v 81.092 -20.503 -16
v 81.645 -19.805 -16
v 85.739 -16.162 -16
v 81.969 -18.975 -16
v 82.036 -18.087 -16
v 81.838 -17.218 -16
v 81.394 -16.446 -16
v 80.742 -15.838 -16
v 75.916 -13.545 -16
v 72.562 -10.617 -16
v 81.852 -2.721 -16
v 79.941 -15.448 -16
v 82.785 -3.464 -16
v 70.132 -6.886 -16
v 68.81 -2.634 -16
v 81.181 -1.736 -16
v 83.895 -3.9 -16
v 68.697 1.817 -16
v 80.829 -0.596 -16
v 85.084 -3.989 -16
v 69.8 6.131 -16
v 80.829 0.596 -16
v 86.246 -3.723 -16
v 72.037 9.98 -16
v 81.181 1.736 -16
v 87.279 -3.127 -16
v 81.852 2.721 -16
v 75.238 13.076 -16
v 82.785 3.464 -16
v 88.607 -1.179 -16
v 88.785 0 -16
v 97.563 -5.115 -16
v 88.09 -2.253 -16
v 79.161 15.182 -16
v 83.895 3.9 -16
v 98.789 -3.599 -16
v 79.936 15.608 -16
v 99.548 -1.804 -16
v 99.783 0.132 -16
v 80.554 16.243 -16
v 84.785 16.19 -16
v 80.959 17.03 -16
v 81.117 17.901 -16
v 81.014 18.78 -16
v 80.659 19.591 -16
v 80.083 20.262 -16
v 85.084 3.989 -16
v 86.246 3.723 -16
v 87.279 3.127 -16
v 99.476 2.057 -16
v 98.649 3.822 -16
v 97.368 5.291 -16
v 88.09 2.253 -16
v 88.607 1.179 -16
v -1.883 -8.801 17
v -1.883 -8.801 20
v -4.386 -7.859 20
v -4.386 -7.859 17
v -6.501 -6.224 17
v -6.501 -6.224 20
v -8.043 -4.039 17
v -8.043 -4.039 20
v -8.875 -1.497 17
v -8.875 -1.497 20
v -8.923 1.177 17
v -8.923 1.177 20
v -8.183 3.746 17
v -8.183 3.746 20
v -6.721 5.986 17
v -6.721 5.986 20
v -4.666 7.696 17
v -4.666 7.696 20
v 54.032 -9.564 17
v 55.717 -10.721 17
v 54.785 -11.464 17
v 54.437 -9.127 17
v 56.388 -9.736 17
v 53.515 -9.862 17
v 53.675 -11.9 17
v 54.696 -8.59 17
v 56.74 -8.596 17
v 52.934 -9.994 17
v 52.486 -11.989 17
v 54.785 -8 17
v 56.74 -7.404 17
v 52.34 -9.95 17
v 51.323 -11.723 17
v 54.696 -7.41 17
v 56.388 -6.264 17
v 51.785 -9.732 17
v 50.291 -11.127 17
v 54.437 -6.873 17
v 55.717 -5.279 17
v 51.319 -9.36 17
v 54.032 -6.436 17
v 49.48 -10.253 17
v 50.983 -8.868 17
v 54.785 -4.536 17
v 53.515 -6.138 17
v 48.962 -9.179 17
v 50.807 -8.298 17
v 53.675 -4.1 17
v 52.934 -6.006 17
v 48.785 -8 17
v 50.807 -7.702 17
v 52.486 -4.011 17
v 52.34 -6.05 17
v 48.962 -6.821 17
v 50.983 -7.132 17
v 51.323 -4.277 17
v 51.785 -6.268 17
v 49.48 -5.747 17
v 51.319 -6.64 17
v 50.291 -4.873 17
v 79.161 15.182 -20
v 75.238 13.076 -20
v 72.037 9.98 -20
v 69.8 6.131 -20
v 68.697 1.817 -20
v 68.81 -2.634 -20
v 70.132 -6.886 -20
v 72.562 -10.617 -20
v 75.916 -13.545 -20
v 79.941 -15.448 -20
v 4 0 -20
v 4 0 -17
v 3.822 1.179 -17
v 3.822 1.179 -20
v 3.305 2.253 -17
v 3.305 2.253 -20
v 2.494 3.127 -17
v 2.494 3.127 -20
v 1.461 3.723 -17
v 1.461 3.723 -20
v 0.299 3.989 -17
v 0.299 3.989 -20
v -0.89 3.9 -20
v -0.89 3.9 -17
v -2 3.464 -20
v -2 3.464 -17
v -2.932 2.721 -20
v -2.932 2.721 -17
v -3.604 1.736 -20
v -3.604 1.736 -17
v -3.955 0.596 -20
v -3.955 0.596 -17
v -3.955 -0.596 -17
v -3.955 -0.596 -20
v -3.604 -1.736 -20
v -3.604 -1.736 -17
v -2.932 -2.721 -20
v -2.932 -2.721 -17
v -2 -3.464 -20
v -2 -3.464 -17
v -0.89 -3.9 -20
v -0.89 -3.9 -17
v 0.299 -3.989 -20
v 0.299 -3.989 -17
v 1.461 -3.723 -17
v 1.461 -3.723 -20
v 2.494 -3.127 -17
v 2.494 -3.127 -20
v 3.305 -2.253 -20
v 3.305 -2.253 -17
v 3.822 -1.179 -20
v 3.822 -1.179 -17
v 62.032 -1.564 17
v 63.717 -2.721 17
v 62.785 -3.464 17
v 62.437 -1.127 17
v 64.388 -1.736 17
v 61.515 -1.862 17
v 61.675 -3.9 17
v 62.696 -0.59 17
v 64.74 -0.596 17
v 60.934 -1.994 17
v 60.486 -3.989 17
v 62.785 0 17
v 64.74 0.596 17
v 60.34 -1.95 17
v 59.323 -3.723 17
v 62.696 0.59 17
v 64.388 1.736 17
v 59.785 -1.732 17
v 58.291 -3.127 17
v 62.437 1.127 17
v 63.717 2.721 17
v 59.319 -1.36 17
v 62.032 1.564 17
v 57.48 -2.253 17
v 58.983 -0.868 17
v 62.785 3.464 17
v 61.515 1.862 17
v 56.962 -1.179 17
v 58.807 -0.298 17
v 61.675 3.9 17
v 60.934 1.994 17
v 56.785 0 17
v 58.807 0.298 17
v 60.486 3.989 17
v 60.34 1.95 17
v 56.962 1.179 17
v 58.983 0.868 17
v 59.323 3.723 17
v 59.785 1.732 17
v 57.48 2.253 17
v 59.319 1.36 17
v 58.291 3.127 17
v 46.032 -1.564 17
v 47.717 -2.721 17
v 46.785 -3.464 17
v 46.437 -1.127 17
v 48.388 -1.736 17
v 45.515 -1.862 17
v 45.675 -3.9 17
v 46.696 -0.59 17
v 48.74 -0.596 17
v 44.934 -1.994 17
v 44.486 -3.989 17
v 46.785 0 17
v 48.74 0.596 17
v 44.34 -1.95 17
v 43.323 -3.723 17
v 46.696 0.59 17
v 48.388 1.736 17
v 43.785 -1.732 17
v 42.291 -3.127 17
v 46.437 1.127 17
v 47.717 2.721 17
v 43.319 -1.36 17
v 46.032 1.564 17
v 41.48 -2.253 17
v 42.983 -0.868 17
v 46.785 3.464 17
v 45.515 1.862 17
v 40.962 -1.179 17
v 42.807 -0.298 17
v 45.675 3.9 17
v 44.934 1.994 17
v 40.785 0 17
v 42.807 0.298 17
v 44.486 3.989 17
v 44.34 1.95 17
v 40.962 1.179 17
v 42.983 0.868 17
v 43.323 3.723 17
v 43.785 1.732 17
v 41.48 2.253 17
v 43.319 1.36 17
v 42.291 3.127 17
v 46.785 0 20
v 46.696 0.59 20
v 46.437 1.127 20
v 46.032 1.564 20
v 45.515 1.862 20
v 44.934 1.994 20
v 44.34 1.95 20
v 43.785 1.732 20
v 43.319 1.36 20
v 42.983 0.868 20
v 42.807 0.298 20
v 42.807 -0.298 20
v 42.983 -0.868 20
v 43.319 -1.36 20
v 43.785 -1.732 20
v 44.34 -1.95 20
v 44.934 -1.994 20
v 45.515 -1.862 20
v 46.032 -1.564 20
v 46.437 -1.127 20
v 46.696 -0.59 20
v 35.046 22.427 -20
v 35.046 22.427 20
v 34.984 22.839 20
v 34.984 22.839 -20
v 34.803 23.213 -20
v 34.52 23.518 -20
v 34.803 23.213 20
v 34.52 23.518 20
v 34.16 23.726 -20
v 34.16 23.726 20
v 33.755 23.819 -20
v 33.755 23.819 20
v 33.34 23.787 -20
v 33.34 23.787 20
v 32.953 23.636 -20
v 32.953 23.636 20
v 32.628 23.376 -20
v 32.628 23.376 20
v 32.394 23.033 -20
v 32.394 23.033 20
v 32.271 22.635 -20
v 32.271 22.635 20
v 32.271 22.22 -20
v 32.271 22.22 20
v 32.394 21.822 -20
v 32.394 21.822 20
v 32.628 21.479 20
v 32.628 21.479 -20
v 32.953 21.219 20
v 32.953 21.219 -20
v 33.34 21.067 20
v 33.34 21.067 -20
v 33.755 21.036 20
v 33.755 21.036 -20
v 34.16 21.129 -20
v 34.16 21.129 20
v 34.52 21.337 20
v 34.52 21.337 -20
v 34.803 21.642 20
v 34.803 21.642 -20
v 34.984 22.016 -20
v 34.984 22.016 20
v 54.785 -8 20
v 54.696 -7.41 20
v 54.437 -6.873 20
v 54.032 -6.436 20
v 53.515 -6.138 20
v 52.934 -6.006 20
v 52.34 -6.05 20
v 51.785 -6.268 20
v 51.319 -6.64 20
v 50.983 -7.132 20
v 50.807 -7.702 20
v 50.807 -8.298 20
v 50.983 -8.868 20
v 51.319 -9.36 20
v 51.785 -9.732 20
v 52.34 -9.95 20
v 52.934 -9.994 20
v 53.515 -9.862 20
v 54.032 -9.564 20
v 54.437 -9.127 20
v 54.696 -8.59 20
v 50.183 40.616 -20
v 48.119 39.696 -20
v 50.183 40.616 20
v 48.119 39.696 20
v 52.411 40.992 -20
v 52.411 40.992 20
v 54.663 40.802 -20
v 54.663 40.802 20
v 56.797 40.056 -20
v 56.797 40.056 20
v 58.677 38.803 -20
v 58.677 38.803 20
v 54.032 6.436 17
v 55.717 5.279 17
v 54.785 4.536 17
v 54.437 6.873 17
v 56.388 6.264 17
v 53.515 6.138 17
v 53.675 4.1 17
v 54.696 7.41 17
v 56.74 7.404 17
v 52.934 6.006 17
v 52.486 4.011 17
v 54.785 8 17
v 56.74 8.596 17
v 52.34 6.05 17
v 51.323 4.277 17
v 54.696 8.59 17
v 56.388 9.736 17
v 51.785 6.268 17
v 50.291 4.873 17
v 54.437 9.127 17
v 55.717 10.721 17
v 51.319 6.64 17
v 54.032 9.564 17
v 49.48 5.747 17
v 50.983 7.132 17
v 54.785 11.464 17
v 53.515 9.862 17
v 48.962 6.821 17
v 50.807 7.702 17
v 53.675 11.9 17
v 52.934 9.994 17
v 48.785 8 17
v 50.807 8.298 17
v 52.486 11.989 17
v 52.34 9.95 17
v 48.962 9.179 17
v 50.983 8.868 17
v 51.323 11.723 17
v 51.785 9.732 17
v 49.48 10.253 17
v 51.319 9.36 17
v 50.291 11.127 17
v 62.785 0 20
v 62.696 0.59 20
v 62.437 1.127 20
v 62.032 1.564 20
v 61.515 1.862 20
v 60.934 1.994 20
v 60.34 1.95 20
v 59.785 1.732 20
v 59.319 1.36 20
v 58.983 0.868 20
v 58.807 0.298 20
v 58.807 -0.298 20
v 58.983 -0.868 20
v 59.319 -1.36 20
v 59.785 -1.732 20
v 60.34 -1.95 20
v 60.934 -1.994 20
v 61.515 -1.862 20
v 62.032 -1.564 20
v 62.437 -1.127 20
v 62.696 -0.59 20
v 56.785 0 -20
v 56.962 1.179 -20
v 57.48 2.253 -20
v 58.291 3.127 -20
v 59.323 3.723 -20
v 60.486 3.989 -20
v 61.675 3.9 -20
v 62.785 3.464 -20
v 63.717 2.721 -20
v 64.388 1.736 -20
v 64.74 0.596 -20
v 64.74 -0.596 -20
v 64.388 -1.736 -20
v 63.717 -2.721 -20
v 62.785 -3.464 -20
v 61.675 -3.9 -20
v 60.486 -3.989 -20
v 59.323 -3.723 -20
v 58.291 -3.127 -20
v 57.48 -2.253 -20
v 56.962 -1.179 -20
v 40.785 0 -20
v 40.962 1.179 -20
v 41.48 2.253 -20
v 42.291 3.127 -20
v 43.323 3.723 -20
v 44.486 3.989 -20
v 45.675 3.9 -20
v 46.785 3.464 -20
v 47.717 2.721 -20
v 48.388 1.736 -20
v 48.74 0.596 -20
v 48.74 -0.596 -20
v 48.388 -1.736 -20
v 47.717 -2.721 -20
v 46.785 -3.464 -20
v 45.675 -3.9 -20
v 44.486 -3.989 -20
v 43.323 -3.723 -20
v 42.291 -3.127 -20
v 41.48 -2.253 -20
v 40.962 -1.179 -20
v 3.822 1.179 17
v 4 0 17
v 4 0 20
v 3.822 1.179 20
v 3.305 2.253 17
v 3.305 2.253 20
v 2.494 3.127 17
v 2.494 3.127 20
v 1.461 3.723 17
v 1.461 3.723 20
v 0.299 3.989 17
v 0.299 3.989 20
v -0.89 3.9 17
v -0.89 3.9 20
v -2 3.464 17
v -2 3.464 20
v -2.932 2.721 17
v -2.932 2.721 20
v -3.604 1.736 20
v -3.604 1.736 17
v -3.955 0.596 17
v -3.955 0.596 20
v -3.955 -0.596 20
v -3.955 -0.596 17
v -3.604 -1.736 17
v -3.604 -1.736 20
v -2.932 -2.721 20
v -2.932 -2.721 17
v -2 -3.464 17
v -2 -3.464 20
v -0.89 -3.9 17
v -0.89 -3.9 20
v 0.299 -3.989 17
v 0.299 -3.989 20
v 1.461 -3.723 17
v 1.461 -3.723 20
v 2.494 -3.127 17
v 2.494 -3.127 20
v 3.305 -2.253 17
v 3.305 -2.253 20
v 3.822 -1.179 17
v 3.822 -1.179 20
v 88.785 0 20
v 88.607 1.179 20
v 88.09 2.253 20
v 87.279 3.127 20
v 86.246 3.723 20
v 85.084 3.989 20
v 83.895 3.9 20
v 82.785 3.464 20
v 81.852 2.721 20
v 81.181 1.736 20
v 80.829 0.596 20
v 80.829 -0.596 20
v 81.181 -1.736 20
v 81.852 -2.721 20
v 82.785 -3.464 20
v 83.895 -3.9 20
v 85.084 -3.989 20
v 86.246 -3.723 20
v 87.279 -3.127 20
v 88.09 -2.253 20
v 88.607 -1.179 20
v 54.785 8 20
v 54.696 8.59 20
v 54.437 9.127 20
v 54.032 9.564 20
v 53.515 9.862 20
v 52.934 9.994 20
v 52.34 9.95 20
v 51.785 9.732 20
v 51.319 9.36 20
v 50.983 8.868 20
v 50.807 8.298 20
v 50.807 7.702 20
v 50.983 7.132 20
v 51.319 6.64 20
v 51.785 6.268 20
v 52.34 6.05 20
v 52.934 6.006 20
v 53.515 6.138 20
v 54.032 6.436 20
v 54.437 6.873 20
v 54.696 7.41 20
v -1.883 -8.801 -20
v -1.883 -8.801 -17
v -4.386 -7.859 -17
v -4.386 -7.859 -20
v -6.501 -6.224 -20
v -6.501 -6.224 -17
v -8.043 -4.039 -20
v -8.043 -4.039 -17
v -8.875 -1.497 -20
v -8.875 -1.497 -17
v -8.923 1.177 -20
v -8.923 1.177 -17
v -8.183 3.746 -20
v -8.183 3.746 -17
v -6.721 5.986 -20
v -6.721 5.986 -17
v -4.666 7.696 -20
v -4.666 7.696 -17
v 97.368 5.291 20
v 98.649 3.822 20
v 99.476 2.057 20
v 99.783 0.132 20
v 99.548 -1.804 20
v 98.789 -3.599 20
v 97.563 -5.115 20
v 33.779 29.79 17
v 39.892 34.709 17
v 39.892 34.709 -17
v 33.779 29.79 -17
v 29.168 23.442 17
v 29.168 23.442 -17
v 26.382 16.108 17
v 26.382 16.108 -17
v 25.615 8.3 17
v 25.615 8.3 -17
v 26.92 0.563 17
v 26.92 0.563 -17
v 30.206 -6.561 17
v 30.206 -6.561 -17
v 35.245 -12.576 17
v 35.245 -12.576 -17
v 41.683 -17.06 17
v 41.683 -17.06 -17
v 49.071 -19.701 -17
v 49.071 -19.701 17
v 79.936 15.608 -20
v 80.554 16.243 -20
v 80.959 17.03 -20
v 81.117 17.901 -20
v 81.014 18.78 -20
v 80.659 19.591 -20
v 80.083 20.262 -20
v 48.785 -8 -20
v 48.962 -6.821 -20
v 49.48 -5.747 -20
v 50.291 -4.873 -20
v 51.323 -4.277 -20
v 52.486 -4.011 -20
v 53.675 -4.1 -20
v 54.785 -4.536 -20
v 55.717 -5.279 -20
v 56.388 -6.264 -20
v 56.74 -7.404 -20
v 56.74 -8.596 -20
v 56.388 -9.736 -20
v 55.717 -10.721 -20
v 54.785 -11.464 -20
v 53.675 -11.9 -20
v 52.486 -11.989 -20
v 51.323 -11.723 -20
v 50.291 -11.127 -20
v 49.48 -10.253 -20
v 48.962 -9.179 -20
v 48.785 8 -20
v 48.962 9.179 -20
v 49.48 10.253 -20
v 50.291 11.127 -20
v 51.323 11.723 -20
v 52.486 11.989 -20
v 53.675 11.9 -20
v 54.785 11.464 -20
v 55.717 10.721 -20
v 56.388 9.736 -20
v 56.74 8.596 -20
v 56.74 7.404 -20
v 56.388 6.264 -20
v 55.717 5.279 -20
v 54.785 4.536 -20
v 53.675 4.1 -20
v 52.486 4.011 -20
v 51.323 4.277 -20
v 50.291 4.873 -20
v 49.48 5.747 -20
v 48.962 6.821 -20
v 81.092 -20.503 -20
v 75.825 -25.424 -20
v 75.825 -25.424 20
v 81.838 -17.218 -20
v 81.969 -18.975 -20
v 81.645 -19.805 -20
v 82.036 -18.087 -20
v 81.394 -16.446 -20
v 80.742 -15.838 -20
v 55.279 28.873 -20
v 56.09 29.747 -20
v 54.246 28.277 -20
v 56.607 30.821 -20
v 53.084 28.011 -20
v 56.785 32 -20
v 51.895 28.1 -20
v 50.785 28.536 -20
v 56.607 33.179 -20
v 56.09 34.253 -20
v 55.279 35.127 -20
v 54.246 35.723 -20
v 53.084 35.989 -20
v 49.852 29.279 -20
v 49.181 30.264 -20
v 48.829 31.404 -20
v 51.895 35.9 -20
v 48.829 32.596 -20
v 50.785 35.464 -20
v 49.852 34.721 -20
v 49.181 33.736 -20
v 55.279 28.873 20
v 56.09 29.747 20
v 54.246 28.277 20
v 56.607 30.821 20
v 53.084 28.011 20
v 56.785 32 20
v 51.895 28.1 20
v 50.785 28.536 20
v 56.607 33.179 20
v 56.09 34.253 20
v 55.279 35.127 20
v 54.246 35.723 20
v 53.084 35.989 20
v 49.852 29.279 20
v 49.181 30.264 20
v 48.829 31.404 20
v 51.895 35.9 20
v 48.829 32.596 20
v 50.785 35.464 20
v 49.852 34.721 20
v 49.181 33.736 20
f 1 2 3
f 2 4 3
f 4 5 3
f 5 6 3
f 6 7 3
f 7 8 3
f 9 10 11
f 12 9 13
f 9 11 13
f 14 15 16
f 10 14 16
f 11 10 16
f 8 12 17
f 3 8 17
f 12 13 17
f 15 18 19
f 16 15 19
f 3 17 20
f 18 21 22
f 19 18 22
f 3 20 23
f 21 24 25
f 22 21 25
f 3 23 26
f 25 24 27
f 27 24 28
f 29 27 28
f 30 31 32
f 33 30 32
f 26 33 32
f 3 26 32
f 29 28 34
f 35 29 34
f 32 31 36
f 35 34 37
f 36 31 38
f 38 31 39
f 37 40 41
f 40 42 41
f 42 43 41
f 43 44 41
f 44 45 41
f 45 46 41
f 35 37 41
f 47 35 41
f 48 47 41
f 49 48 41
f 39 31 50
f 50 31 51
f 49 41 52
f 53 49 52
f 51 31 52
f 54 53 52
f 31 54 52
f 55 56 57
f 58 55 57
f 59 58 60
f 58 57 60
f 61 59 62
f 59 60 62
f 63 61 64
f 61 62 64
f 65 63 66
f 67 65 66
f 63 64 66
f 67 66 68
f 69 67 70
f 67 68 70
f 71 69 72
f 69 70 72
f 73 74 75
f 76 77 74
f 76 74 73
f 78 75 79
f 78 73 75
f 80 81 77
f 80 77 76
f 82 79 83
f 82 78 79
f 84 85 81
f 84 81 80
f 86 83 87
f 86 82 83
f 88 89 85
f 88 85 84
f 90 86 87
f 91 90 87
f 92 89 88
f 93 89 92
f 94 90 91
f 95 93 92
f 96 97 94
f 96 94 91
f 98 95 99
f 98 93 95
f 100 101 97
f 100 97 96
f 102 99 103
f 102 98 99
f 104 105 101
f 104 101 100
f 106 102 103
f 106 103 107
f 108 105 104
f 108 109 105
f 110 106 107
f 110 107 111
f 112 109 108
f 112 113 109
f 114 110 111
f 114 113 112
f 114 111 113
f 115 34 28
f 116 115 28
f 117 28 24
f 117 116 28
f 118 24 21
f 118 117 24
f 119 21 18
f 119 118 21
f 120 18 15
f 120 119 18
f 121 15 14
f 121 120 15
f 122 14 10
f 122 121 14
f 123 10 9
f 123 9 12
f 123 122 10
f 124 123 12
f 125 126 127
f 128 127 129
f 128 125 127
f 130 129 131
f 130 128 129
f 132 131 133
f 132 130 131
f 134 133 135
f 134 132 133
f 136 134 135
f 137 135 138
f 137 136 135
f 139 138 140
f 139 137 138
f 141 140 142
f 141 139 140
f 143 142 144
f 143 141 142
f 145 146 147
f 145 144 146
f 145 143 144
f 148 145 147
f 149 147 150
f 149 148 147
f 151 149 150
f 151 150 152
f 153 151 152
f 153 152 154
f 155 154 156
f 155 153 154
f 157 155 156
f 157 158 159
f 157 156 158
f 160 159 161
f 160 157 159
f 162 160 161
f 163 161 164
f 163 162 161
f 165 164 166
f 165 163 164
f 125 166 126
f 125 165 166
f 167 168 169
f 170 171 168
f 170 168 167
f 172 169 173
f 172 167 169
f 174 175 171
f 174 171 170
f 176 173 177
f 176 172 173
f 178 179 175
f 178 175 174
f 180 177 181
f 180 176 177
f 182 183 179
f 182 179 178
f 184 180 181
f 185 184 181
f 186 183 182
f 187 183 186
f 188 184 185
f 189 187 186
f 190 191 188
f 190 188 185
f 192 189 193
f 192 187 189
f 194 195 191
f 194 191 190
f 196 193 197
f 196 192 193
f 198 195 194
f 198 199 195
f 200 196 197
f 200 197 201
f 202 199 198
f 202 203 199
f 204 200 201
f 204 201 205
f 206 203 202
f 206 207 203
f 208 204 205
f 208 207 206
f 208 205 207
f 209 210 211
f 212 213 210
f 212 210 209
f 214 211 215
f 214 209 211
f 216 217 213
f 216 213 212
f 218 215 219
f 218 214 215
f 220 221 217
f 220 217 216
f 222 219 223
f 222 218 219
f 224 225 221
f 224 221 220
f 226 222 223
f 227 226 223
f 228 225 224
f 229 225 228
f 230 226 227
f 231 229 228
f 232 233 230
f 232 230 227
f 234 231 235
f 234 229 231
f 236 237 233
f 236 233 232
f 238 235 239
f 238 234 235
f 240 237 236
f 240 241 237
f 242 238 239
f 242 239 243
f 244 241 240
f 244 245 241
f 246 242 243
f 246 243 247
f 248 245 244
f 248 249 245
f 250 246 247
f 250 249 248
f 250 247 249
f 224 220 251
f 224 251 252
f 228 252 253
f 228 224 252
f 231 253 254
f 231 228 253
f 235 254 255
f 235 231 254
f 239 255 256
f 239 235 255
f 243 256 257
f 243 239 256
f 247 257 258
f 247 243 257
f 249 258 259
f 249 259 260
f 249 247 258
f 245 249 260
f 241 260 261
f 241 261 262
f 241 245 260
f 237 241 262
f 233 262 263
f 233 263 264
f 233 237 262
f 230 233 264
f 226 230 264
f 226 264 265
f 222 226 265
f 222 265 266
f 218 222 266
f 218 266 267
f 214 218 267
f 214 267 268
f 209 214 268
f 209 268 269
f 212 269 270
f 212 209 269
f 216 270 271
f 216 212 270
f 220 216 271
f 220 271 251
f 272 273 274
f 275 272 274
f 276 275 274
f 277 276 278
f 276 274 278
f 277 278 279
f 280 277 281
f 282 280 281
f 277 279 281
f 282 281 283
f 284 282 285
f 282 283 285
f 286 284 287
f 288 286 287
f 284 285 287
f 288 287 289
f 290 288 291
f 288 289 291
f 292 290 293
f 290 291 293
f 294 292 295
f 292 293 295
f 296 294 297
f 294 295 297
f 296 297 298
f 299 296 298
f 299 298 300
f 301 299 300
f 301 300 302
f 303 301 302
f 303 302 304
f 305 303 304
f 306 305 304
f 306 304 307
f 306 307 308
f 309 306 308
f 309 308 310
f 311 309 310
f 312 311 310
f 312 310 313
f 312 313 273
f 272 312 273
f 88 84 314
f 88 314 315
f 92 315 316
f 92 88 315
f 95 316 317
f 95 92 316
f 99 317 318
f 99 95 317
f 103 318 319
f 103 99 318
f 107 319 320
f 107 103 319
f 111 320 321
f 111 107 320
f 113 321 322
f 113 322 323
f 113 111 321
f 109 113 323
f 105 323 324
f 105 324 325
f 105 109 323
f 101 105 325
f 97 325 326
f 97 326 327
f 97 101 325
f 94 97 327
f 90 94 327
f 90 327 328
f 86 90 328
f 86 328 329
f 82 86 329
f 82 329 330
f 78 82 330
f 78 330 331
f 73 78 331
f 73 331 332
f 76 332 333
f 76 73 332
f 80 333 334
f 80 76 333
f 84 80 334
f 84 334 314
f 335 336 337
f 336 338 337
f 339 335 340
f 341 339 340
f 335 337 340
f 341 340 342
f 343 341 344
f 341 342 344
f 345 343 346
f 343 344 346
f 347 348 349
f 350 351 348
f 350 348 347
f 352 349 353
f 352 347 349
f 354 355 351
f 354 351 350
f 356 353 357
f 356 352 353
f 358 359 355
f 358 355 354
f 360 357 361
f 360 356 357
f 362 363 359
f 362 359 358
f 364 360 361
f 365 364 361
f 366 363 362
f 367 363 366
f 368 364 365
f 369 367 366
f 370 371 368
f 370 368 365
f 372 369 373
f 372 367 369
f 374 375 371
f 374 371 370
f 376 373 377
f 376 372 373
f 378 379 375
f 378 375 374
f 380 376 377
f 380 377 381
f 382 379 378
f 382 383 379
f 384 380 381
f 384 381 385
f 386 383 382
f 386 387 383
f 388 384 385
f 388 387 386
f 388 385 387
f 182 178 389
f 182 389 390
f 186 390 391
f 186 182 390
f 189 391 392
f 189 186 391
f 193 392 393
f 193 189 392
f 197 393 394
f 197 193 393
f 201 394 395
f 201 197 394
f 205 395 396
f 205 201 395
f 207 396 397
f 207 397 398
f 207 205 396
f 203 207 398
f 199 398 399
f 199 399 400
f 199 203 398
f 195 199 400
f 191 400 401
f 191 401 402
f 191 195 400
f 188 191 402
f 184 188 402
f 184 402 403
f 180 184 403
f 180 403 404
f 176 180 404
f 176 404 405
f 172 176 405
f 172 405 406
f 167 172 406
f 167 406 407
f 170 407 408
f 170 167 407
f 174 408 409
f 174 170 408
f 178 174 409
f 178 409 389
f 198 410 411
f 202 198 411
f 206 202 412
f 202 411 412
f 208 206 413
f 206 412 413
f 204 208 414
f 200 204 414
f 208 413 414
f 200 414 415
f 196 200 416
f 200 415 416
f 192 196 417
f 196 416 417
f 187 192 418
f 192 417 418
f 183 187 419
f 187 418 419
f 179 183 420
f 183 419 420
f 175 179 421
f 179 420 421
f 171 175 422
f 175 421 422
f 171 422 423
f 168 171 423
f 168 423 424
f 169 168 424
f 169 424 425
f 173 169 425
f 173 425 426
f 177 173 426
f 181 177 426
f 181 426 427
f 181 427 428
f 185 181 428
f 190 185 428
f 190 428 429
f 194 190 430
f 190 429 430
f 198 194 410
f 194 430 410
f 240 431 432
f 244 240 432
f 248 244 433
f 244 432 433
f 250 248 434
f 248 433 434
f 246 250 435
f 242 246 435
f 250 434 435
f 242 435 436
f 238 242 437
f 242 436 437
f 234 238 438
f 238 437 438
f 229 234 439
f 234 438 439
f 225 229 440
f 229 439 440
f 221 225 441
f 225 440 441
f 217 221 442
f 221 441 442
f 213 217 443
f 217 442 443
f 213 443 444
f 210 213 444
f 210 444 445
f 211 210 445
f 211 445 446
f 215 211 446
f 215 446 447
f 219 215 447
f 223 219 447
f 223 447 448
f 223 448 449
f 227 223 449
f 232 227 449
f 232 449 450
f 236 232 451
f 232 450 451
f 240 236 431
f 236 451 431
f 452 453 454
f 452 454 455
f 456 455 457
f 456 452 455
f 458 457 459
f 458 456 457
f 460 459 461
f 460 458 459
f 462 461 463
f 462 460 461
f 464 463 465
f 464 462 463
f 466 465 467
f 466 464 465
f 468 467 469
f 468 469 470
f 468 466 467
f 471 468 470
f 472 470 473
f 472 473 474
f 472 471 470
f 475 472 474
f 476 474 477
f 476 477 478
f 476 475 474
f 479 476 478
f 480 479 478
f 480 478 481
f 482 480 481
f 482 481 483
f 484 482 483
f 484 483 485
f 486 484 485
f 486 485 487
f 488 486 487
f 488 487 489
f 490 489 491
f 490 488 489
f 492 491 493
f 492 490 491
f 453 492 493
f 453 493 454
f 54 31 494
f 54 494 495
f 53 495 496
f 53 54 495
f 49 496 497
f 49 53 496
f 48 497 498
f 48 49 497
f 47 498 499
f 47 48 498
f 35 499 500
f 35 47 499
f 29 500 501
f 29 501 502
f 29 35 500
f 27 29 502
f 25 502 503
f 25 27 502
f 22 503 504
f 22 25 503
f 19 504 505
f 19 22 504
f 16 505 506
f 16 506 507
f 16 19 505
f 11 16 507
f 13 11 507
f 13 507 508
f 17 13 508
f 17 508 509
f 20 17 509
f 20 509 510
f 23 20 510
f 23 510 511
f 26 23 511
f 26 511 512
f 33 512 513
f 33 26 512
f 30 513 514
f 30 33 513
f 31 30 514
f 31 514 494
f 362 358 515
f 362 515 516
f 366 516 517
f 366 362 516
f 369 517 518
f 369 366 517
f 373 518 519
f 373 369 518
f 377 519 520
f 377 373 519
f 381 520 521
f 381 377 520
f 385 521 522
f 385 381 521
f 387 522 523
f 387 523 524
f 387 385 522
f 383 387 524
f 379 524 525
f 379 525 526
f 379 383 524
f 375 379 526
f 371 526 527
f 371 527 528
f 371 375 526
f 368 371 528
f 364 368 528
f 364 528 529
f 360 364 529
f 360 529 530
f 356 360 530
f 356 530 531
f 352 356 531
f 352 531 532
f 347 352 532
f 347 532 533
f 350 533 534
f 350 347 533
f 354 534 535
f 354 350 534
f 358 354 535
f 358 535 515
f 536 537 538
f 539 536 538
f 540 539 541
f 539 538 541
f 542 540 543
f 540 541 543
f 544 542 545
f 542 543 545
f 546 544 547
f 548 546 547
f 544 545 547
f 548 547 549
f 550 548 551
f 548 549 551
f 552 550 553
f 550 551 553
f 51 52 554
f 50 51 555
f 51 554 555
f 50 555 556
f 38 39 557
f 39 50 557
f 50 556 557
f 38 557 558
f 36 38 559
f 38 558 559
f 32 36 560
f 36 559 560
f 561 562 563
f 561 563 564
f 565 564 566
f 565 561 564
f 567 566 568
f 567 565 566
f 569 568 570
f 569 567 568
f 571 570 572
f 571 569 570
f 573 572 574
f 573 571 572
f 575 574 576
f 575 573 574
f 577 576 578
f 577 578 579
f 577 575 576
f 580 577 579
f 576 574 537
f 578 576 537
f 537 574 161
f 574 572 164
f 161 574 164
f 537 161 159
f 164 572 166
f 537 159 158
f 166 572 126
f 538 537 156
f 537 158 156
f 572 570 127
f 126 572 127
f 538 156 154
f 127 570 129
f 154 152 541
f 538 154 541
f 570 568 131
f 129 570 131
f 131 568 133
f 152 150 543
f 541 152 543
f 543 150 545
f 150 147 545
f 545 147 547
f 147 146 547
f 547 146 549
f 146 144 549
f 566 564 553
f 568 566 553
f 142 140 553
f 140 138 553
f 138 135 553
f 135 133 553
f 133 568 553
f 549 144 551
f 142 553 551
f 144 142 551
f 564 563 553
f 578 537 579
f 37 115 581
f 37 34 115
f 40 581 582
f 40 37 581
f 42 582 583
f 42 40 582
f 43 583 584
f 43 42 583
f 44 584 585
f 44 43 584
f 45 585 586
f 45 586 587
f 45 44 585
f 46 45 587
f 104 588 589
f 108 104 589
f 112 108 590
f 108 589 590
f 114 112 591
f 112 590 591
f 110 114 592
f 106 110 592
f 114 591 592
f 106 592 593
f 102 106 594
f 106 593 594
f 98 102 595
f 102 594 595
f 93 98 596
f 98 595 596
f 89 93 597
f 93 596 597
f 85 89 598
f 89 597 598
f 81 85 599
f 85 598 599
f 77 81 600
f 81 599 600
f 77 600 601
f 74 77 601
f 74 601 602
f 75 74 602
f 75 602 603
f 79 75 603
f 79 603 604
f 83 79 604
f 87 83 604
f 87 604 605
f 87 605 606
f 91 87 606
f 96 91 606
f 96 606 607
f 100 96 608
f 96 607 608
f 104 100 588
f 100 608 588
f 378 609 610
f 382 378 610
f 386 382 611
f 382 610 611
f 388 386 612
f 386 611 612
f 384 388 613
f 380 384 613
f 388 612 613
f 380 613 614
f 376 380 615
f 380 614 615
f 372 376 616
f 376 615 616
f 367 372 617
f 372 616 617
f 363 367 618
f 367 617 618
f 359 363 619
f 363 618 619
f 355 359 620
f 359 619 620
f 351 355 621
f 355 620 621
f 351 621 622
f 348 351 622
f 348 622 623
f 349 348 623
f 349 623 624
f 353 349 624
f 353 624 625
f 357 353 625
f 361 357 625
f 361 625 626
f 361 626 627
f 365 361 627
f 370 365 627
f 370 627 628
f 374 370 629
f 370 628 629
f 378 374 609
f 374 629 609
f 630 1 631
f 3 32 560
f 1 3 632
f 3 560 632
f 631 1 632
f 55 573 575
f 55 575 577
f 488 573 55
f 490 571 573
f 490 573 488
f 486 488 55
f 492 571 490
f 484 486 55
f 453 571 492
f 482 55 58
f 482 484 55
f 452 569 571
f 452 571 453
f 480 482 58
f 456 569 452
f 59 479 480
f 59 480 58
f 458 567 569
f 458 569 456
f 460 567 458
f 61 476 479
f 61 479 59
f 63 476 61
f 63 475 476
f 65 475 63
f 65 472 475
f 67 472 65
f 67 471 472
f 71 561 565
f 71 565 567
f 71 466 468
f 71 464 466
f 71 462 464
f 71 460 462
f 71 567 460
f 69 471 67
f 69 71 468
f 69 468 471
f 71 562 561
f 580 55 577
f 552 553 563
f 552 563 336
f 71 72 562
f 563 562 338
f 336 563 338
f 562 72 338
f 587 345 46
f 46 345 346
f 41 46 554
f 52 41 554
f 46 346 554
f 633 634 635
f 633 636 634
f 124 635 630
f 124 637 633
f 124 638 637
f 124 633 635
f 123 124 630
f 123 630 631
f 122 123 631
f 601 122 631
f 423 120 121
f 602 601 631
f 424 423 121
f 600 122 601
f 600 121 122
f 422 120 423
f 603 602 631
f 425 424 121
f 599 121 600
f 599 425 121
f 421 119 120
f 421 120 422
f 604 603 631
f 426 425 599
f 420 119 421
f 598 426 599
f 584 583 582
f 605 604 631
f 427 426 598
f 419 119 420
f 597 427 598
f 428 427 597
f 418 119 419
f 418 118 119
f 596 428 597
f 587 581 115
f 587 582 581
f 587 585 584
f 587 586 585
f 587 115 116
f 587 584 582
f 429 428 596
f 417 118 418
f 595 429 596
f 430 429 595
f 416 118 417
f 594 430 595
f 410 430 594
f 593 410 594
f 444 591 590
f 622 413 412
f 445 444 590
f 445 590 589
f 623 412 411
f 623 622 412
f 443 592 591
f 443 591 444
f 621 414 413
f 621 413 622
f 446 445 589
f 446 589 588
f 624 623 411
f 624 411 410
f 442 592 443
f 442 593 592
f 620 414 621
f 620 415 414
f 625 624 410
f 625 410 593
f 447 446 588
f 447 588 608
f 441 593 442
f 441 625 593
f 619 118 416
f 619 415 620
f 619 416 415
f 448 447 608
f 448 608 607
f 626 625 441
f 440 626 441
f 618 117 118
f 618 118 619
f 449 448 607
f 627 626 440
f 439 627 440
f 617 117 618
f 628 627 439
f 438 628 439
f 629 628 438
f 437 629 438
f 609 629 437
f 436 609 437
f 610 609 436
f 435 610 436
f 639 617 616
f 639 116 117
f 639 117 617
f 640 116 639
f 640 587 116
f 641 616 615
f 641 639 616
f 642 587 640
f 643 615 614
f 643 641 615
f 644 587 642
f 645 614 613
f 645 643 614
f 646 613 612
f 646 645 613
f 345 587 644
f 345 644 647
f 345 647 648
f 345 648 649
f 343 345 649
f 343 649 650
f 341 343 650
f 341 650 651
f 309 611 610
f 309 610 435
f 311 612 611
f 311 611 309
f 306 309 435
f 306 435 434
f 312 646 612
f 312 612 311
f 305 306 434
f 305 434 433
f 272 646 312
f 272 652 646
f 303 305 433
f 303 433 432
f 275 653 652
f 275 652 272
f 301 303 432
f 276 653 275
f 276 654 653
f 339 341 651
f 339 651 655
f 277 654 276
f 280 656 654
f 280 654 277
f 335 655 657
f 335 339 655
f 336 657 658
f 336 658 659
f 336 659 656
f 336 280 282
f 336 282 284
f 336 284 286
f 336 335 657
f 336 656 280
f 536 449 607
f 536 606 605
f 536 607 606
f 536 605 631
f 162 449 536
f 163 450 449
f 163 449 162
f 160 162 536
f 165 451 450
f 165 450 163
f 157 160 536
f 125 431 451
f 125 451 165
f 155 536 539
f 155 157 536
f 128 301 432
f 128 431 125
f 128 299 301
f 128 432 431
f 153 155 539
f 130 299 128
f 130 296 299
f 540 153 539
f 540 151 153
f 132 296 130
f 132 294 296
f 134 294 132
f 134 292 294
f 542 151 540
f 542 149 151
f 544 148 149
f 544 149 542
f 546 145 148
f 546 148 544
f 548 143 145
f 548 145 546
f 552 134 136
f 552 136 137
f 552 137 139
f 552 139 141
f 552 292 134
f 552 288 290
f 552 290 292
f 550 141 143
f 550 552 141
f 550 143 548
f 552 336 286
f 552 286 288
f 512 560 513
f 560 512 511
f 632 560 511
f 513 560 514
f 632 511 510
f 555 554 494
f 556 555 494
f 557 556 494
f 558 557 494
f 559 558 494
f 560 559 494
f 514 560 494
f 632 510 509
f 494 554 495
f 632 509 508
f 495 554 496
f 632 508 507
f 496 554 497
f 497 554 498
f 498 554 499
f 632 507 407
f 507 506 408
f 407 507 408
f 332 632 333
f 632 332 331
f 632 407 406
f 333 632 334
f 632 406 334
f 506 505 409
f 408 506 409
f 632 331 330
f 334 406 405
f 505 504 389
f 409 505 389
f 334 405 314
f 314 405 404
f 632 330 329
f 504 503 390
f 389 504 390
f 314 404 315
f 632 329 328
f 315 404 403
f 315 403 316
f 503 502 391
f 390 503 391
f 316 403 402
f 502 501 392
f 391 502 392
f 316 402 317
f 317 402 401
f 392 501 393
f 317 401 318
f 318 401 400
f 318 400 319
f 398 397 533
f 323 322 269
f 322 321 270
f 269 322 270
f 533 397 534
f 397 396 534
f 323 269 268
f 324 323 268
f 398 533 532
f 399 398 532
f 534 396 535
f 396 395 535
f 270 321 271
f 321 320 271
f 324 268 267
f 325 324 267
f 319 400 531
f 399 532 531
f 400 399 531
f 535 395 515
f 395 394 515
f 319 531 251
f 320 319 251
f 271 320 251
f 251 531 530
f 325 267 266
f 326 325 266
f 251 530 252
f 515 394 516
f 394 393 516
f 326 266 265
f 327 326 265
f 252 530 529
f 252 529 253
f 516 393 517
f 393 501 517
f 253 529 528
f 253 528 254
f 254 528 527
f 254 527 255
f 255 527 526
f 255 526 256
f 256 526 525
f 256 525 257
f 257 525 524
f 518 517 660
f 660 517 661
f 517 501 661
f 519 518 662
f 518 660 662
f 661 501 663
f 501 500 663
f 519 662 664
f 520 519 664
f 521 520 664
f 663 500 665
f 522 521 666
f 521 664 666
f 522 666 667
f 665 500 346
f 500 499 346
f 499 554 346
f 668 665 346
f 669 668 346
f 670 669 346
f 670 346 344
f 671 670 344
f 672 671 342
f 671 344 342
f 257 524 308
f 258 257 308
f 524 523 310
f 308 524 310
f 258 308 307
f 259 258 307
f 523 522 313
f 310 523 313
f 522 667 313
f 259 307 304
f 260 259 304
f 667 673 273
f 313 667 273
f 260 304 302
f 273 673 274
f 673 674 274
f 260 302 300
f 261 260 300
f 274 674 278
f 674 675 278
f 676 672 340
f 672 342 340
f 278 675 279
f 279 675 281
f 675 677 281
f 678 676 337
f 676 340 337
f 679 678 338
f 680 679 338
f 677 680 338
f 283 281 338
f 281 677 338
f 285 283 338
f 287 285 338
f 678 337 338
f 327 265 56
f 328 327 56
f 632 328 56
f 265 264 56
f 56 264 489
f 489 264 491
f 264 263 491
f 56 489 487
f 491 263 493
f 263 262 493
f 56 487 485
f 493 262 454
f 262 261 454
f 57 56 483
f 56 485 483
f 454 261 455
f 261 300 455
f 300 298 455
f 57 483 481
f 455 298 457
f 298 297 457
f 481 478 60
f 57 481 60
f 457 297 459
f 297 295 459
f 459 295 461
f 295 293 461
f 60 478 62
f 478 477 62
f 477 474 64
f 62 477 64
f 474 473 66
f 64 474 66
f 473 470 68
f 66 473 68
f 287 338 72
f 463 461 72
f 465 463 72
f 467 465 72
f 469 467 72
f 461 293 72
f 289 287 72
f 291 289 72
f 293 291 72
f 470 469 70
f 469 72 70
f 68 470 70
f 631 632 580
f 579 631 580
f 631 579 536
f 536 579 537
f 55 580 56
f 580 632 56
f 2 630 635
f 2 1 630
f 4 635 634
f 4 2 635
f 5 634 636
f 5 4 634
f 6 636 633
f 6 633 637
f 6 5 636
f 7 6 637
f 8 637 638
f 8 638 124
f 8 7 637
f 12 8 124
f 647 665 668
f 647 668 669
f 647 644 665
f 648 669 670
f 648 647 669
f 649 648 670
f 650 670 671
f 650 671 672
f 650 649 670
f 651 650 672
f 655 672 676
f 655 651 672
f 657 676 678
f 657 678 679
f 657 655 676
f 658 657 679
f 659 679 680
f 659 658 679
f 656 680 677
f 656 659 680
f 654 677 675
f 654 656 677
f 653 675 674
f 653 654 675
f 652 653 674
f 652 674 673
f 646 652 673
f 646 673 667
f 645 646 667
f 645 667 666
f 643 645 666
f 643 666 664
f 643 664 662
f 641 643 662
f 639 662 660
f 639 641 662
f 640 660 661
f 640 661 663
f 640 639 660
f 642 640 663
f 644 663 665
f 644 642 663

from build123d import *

# Parameters (mm, degrees)
SKETCH1_R               = 4
SKETCH1_R_2             = 2
BOSS_EXTRUDE1_DEPTH     = 20
CUT_EXTRUDE1_DEPTH      = 17
CUT_EXTRUDE1_DEPTH_BACK = 17
SKETCH3_R               = 4
CUT_EXTRUDE2_DEPTH      = 37
SKETCH4_R               = 1.395
CUT_EXTRUDE3_DEPTH      = 41
CUT_EXTRUDE4_DEPTH      = 4
FILLET1_R               = 3


with BuildPart() as part:
    # Sketch1 → Boss-Extrude1 (new body, symmetric)
    with BuildSketch(Plane.XY):
        with BuildLine():
            Line((-4.665710042, 7.69617761), (48.118899649, 39.69617761))
            ThreePointArc((48.118899649, 39.69617761), (53.543313423, 40.967963461), (58.676968473, 38.802948477))
            Line((58.676968473, 38.802948477), (97.36755541, 5.291182149))
            ThreePointArc((97.36755541, 5.291182149), (99.783371388, 0.131661326), (97.563318746, -5.115069869))
            Line((97.563318746, -5.115069869), (75.824988549, -25.423913737))
            Line((75.824988549, -25.423913737), (-1.882663558, -8.800885065))
            ThreePointArc((-1.882663558, -8.800885065), (-8.874602438, -1.497141134), (-4.665710042, 7.69617761))
        make_face()
        Circle(SKETCH1_R, mode=Mode.SUBTRACT)
        with Locations((84.784609691, 0)):
            Circle(SKETCH1_R, mode=Mode.SUBTRACT)
        with Locations((60.784609691, 0)):
            Circle(SKETCH1_R_2, mode=Mode.SUBTRACT)
        with Locations((52.784609691, -8)):
            Circle(SKETCH1_R_2, mode=Mode.SUBTRACT)
        with Locations((44.784609691, 0)):
            Circle(SKETCH1_R_2, mode=Mode.SUBTRACT)
        with Locations((52.784609691, 8)):
            Circle(SKETCH1_R_2, mode=Mode.SUBTRACT)
        with Locations((52.784609691, 32)):
            Circle(SKETCH1_R, mode=Mode.SUBTRACT)
    extrude(amount=BOSS_EXTRUDE1_DEPTH, both=True)

    # Sketch2 → Cut-Extrude1 (cut, two sides)
    with BuildSketch(Plane.XY) as cut_extrude1_sk:
        with BuildLine():
            Line((-4.665710042, 7.69617761), (39.891888688, 34.708656583))
            ThreePointArc((39.891888688, 34.708656583), (26.010438267, 4.38794834), (49.070722017, -19.700707237))
            Line((49.070722017, -19.700707237), (-1.882663558, -8.800885065))
            ThreePointArc((-1.882663558, -8.800885065), (-8.874602438, -1.497141134), (-4.665710042, 7.69617761))
        make_face()
    extrude(amount=CUT_EXTRUDE1_DEPTH, mode=Mode.SUBTRACT)
    extrude(cut_extrude1_sk.sketch, amount=-CUT_EXTRUDE1_DEPTH_BACK, mode=Mode.SUBTRACT)

    # Sketch3 → Cut-Extrude2 (cut)
    with BuildSketch(Plane(origin=(0, 0, -20), x_dir=(-1, 0, 0), z_dir=(0, 0, -1))):
        with Locations((-52.784609691, 8)):
            Circle(SKETCH3_R)
        with Locations((-60.784609691, 0)):
            Circle(SKETCH3_R)
        with Locations((-52.784609691, -8)):
            Circle(SKETCH3_R)
        with Locations((-44.784609691, 0)):
            Circle(SKETCH3_R)
    extrude(amount=-CUT_EXTRUDE2_DEPTH, mode=Mode.SUBTRACT)

    # Sketch4 → Cut-Extrude3 (cut, through all)
    with BuildSketch(Plane.XY.offset(20)):
        with Locations((33.650538517, 22.427469232)):
            Circle(SKETCH4_R)
    extrude(amount=-CUT_EXTRUDE3_DEPTH, mode=Mode.SUBTRACT)

    # Sketch5 → Cut-Extrude4 (cut)
    with BuildSketch(Plane(origin=(0, 0, -20), x_dir=(-1, 0, 0), z_dir=(0, 0, -1))):
        with BuildLine():
            Line((-97.36755541, 5.291182149), (-84.784609691, 16.189872762))
            ThreePointArc((-84.784609691, 16.189872762), (-68.601779215, -0.477470257), (-85.739134824, -16.161709743))
            Line((-85.739134824, -16.161709743), (-97.563318746, -5.115069869))
            ThreePointArc((-97.563318746, -5.115069869), (-99.783371388, 0.131661326), (-97.36755541, 5.291182149))
        make_face()
    extrude(amount=-CUT_EXTRUDE4_DEPTH, mode=Mode.SUBTRACT)

    # Fillet1
    fillet1_edges = [part.edges().sort_by_distance(p)[0] for p in [
        (84.784609691, 16.189872762, -18),
        (85.739134824, -16.161709743, -18),
    ]]
    fillet(fillet1_edges, radius=FILLET1_R)


solid = part.part
